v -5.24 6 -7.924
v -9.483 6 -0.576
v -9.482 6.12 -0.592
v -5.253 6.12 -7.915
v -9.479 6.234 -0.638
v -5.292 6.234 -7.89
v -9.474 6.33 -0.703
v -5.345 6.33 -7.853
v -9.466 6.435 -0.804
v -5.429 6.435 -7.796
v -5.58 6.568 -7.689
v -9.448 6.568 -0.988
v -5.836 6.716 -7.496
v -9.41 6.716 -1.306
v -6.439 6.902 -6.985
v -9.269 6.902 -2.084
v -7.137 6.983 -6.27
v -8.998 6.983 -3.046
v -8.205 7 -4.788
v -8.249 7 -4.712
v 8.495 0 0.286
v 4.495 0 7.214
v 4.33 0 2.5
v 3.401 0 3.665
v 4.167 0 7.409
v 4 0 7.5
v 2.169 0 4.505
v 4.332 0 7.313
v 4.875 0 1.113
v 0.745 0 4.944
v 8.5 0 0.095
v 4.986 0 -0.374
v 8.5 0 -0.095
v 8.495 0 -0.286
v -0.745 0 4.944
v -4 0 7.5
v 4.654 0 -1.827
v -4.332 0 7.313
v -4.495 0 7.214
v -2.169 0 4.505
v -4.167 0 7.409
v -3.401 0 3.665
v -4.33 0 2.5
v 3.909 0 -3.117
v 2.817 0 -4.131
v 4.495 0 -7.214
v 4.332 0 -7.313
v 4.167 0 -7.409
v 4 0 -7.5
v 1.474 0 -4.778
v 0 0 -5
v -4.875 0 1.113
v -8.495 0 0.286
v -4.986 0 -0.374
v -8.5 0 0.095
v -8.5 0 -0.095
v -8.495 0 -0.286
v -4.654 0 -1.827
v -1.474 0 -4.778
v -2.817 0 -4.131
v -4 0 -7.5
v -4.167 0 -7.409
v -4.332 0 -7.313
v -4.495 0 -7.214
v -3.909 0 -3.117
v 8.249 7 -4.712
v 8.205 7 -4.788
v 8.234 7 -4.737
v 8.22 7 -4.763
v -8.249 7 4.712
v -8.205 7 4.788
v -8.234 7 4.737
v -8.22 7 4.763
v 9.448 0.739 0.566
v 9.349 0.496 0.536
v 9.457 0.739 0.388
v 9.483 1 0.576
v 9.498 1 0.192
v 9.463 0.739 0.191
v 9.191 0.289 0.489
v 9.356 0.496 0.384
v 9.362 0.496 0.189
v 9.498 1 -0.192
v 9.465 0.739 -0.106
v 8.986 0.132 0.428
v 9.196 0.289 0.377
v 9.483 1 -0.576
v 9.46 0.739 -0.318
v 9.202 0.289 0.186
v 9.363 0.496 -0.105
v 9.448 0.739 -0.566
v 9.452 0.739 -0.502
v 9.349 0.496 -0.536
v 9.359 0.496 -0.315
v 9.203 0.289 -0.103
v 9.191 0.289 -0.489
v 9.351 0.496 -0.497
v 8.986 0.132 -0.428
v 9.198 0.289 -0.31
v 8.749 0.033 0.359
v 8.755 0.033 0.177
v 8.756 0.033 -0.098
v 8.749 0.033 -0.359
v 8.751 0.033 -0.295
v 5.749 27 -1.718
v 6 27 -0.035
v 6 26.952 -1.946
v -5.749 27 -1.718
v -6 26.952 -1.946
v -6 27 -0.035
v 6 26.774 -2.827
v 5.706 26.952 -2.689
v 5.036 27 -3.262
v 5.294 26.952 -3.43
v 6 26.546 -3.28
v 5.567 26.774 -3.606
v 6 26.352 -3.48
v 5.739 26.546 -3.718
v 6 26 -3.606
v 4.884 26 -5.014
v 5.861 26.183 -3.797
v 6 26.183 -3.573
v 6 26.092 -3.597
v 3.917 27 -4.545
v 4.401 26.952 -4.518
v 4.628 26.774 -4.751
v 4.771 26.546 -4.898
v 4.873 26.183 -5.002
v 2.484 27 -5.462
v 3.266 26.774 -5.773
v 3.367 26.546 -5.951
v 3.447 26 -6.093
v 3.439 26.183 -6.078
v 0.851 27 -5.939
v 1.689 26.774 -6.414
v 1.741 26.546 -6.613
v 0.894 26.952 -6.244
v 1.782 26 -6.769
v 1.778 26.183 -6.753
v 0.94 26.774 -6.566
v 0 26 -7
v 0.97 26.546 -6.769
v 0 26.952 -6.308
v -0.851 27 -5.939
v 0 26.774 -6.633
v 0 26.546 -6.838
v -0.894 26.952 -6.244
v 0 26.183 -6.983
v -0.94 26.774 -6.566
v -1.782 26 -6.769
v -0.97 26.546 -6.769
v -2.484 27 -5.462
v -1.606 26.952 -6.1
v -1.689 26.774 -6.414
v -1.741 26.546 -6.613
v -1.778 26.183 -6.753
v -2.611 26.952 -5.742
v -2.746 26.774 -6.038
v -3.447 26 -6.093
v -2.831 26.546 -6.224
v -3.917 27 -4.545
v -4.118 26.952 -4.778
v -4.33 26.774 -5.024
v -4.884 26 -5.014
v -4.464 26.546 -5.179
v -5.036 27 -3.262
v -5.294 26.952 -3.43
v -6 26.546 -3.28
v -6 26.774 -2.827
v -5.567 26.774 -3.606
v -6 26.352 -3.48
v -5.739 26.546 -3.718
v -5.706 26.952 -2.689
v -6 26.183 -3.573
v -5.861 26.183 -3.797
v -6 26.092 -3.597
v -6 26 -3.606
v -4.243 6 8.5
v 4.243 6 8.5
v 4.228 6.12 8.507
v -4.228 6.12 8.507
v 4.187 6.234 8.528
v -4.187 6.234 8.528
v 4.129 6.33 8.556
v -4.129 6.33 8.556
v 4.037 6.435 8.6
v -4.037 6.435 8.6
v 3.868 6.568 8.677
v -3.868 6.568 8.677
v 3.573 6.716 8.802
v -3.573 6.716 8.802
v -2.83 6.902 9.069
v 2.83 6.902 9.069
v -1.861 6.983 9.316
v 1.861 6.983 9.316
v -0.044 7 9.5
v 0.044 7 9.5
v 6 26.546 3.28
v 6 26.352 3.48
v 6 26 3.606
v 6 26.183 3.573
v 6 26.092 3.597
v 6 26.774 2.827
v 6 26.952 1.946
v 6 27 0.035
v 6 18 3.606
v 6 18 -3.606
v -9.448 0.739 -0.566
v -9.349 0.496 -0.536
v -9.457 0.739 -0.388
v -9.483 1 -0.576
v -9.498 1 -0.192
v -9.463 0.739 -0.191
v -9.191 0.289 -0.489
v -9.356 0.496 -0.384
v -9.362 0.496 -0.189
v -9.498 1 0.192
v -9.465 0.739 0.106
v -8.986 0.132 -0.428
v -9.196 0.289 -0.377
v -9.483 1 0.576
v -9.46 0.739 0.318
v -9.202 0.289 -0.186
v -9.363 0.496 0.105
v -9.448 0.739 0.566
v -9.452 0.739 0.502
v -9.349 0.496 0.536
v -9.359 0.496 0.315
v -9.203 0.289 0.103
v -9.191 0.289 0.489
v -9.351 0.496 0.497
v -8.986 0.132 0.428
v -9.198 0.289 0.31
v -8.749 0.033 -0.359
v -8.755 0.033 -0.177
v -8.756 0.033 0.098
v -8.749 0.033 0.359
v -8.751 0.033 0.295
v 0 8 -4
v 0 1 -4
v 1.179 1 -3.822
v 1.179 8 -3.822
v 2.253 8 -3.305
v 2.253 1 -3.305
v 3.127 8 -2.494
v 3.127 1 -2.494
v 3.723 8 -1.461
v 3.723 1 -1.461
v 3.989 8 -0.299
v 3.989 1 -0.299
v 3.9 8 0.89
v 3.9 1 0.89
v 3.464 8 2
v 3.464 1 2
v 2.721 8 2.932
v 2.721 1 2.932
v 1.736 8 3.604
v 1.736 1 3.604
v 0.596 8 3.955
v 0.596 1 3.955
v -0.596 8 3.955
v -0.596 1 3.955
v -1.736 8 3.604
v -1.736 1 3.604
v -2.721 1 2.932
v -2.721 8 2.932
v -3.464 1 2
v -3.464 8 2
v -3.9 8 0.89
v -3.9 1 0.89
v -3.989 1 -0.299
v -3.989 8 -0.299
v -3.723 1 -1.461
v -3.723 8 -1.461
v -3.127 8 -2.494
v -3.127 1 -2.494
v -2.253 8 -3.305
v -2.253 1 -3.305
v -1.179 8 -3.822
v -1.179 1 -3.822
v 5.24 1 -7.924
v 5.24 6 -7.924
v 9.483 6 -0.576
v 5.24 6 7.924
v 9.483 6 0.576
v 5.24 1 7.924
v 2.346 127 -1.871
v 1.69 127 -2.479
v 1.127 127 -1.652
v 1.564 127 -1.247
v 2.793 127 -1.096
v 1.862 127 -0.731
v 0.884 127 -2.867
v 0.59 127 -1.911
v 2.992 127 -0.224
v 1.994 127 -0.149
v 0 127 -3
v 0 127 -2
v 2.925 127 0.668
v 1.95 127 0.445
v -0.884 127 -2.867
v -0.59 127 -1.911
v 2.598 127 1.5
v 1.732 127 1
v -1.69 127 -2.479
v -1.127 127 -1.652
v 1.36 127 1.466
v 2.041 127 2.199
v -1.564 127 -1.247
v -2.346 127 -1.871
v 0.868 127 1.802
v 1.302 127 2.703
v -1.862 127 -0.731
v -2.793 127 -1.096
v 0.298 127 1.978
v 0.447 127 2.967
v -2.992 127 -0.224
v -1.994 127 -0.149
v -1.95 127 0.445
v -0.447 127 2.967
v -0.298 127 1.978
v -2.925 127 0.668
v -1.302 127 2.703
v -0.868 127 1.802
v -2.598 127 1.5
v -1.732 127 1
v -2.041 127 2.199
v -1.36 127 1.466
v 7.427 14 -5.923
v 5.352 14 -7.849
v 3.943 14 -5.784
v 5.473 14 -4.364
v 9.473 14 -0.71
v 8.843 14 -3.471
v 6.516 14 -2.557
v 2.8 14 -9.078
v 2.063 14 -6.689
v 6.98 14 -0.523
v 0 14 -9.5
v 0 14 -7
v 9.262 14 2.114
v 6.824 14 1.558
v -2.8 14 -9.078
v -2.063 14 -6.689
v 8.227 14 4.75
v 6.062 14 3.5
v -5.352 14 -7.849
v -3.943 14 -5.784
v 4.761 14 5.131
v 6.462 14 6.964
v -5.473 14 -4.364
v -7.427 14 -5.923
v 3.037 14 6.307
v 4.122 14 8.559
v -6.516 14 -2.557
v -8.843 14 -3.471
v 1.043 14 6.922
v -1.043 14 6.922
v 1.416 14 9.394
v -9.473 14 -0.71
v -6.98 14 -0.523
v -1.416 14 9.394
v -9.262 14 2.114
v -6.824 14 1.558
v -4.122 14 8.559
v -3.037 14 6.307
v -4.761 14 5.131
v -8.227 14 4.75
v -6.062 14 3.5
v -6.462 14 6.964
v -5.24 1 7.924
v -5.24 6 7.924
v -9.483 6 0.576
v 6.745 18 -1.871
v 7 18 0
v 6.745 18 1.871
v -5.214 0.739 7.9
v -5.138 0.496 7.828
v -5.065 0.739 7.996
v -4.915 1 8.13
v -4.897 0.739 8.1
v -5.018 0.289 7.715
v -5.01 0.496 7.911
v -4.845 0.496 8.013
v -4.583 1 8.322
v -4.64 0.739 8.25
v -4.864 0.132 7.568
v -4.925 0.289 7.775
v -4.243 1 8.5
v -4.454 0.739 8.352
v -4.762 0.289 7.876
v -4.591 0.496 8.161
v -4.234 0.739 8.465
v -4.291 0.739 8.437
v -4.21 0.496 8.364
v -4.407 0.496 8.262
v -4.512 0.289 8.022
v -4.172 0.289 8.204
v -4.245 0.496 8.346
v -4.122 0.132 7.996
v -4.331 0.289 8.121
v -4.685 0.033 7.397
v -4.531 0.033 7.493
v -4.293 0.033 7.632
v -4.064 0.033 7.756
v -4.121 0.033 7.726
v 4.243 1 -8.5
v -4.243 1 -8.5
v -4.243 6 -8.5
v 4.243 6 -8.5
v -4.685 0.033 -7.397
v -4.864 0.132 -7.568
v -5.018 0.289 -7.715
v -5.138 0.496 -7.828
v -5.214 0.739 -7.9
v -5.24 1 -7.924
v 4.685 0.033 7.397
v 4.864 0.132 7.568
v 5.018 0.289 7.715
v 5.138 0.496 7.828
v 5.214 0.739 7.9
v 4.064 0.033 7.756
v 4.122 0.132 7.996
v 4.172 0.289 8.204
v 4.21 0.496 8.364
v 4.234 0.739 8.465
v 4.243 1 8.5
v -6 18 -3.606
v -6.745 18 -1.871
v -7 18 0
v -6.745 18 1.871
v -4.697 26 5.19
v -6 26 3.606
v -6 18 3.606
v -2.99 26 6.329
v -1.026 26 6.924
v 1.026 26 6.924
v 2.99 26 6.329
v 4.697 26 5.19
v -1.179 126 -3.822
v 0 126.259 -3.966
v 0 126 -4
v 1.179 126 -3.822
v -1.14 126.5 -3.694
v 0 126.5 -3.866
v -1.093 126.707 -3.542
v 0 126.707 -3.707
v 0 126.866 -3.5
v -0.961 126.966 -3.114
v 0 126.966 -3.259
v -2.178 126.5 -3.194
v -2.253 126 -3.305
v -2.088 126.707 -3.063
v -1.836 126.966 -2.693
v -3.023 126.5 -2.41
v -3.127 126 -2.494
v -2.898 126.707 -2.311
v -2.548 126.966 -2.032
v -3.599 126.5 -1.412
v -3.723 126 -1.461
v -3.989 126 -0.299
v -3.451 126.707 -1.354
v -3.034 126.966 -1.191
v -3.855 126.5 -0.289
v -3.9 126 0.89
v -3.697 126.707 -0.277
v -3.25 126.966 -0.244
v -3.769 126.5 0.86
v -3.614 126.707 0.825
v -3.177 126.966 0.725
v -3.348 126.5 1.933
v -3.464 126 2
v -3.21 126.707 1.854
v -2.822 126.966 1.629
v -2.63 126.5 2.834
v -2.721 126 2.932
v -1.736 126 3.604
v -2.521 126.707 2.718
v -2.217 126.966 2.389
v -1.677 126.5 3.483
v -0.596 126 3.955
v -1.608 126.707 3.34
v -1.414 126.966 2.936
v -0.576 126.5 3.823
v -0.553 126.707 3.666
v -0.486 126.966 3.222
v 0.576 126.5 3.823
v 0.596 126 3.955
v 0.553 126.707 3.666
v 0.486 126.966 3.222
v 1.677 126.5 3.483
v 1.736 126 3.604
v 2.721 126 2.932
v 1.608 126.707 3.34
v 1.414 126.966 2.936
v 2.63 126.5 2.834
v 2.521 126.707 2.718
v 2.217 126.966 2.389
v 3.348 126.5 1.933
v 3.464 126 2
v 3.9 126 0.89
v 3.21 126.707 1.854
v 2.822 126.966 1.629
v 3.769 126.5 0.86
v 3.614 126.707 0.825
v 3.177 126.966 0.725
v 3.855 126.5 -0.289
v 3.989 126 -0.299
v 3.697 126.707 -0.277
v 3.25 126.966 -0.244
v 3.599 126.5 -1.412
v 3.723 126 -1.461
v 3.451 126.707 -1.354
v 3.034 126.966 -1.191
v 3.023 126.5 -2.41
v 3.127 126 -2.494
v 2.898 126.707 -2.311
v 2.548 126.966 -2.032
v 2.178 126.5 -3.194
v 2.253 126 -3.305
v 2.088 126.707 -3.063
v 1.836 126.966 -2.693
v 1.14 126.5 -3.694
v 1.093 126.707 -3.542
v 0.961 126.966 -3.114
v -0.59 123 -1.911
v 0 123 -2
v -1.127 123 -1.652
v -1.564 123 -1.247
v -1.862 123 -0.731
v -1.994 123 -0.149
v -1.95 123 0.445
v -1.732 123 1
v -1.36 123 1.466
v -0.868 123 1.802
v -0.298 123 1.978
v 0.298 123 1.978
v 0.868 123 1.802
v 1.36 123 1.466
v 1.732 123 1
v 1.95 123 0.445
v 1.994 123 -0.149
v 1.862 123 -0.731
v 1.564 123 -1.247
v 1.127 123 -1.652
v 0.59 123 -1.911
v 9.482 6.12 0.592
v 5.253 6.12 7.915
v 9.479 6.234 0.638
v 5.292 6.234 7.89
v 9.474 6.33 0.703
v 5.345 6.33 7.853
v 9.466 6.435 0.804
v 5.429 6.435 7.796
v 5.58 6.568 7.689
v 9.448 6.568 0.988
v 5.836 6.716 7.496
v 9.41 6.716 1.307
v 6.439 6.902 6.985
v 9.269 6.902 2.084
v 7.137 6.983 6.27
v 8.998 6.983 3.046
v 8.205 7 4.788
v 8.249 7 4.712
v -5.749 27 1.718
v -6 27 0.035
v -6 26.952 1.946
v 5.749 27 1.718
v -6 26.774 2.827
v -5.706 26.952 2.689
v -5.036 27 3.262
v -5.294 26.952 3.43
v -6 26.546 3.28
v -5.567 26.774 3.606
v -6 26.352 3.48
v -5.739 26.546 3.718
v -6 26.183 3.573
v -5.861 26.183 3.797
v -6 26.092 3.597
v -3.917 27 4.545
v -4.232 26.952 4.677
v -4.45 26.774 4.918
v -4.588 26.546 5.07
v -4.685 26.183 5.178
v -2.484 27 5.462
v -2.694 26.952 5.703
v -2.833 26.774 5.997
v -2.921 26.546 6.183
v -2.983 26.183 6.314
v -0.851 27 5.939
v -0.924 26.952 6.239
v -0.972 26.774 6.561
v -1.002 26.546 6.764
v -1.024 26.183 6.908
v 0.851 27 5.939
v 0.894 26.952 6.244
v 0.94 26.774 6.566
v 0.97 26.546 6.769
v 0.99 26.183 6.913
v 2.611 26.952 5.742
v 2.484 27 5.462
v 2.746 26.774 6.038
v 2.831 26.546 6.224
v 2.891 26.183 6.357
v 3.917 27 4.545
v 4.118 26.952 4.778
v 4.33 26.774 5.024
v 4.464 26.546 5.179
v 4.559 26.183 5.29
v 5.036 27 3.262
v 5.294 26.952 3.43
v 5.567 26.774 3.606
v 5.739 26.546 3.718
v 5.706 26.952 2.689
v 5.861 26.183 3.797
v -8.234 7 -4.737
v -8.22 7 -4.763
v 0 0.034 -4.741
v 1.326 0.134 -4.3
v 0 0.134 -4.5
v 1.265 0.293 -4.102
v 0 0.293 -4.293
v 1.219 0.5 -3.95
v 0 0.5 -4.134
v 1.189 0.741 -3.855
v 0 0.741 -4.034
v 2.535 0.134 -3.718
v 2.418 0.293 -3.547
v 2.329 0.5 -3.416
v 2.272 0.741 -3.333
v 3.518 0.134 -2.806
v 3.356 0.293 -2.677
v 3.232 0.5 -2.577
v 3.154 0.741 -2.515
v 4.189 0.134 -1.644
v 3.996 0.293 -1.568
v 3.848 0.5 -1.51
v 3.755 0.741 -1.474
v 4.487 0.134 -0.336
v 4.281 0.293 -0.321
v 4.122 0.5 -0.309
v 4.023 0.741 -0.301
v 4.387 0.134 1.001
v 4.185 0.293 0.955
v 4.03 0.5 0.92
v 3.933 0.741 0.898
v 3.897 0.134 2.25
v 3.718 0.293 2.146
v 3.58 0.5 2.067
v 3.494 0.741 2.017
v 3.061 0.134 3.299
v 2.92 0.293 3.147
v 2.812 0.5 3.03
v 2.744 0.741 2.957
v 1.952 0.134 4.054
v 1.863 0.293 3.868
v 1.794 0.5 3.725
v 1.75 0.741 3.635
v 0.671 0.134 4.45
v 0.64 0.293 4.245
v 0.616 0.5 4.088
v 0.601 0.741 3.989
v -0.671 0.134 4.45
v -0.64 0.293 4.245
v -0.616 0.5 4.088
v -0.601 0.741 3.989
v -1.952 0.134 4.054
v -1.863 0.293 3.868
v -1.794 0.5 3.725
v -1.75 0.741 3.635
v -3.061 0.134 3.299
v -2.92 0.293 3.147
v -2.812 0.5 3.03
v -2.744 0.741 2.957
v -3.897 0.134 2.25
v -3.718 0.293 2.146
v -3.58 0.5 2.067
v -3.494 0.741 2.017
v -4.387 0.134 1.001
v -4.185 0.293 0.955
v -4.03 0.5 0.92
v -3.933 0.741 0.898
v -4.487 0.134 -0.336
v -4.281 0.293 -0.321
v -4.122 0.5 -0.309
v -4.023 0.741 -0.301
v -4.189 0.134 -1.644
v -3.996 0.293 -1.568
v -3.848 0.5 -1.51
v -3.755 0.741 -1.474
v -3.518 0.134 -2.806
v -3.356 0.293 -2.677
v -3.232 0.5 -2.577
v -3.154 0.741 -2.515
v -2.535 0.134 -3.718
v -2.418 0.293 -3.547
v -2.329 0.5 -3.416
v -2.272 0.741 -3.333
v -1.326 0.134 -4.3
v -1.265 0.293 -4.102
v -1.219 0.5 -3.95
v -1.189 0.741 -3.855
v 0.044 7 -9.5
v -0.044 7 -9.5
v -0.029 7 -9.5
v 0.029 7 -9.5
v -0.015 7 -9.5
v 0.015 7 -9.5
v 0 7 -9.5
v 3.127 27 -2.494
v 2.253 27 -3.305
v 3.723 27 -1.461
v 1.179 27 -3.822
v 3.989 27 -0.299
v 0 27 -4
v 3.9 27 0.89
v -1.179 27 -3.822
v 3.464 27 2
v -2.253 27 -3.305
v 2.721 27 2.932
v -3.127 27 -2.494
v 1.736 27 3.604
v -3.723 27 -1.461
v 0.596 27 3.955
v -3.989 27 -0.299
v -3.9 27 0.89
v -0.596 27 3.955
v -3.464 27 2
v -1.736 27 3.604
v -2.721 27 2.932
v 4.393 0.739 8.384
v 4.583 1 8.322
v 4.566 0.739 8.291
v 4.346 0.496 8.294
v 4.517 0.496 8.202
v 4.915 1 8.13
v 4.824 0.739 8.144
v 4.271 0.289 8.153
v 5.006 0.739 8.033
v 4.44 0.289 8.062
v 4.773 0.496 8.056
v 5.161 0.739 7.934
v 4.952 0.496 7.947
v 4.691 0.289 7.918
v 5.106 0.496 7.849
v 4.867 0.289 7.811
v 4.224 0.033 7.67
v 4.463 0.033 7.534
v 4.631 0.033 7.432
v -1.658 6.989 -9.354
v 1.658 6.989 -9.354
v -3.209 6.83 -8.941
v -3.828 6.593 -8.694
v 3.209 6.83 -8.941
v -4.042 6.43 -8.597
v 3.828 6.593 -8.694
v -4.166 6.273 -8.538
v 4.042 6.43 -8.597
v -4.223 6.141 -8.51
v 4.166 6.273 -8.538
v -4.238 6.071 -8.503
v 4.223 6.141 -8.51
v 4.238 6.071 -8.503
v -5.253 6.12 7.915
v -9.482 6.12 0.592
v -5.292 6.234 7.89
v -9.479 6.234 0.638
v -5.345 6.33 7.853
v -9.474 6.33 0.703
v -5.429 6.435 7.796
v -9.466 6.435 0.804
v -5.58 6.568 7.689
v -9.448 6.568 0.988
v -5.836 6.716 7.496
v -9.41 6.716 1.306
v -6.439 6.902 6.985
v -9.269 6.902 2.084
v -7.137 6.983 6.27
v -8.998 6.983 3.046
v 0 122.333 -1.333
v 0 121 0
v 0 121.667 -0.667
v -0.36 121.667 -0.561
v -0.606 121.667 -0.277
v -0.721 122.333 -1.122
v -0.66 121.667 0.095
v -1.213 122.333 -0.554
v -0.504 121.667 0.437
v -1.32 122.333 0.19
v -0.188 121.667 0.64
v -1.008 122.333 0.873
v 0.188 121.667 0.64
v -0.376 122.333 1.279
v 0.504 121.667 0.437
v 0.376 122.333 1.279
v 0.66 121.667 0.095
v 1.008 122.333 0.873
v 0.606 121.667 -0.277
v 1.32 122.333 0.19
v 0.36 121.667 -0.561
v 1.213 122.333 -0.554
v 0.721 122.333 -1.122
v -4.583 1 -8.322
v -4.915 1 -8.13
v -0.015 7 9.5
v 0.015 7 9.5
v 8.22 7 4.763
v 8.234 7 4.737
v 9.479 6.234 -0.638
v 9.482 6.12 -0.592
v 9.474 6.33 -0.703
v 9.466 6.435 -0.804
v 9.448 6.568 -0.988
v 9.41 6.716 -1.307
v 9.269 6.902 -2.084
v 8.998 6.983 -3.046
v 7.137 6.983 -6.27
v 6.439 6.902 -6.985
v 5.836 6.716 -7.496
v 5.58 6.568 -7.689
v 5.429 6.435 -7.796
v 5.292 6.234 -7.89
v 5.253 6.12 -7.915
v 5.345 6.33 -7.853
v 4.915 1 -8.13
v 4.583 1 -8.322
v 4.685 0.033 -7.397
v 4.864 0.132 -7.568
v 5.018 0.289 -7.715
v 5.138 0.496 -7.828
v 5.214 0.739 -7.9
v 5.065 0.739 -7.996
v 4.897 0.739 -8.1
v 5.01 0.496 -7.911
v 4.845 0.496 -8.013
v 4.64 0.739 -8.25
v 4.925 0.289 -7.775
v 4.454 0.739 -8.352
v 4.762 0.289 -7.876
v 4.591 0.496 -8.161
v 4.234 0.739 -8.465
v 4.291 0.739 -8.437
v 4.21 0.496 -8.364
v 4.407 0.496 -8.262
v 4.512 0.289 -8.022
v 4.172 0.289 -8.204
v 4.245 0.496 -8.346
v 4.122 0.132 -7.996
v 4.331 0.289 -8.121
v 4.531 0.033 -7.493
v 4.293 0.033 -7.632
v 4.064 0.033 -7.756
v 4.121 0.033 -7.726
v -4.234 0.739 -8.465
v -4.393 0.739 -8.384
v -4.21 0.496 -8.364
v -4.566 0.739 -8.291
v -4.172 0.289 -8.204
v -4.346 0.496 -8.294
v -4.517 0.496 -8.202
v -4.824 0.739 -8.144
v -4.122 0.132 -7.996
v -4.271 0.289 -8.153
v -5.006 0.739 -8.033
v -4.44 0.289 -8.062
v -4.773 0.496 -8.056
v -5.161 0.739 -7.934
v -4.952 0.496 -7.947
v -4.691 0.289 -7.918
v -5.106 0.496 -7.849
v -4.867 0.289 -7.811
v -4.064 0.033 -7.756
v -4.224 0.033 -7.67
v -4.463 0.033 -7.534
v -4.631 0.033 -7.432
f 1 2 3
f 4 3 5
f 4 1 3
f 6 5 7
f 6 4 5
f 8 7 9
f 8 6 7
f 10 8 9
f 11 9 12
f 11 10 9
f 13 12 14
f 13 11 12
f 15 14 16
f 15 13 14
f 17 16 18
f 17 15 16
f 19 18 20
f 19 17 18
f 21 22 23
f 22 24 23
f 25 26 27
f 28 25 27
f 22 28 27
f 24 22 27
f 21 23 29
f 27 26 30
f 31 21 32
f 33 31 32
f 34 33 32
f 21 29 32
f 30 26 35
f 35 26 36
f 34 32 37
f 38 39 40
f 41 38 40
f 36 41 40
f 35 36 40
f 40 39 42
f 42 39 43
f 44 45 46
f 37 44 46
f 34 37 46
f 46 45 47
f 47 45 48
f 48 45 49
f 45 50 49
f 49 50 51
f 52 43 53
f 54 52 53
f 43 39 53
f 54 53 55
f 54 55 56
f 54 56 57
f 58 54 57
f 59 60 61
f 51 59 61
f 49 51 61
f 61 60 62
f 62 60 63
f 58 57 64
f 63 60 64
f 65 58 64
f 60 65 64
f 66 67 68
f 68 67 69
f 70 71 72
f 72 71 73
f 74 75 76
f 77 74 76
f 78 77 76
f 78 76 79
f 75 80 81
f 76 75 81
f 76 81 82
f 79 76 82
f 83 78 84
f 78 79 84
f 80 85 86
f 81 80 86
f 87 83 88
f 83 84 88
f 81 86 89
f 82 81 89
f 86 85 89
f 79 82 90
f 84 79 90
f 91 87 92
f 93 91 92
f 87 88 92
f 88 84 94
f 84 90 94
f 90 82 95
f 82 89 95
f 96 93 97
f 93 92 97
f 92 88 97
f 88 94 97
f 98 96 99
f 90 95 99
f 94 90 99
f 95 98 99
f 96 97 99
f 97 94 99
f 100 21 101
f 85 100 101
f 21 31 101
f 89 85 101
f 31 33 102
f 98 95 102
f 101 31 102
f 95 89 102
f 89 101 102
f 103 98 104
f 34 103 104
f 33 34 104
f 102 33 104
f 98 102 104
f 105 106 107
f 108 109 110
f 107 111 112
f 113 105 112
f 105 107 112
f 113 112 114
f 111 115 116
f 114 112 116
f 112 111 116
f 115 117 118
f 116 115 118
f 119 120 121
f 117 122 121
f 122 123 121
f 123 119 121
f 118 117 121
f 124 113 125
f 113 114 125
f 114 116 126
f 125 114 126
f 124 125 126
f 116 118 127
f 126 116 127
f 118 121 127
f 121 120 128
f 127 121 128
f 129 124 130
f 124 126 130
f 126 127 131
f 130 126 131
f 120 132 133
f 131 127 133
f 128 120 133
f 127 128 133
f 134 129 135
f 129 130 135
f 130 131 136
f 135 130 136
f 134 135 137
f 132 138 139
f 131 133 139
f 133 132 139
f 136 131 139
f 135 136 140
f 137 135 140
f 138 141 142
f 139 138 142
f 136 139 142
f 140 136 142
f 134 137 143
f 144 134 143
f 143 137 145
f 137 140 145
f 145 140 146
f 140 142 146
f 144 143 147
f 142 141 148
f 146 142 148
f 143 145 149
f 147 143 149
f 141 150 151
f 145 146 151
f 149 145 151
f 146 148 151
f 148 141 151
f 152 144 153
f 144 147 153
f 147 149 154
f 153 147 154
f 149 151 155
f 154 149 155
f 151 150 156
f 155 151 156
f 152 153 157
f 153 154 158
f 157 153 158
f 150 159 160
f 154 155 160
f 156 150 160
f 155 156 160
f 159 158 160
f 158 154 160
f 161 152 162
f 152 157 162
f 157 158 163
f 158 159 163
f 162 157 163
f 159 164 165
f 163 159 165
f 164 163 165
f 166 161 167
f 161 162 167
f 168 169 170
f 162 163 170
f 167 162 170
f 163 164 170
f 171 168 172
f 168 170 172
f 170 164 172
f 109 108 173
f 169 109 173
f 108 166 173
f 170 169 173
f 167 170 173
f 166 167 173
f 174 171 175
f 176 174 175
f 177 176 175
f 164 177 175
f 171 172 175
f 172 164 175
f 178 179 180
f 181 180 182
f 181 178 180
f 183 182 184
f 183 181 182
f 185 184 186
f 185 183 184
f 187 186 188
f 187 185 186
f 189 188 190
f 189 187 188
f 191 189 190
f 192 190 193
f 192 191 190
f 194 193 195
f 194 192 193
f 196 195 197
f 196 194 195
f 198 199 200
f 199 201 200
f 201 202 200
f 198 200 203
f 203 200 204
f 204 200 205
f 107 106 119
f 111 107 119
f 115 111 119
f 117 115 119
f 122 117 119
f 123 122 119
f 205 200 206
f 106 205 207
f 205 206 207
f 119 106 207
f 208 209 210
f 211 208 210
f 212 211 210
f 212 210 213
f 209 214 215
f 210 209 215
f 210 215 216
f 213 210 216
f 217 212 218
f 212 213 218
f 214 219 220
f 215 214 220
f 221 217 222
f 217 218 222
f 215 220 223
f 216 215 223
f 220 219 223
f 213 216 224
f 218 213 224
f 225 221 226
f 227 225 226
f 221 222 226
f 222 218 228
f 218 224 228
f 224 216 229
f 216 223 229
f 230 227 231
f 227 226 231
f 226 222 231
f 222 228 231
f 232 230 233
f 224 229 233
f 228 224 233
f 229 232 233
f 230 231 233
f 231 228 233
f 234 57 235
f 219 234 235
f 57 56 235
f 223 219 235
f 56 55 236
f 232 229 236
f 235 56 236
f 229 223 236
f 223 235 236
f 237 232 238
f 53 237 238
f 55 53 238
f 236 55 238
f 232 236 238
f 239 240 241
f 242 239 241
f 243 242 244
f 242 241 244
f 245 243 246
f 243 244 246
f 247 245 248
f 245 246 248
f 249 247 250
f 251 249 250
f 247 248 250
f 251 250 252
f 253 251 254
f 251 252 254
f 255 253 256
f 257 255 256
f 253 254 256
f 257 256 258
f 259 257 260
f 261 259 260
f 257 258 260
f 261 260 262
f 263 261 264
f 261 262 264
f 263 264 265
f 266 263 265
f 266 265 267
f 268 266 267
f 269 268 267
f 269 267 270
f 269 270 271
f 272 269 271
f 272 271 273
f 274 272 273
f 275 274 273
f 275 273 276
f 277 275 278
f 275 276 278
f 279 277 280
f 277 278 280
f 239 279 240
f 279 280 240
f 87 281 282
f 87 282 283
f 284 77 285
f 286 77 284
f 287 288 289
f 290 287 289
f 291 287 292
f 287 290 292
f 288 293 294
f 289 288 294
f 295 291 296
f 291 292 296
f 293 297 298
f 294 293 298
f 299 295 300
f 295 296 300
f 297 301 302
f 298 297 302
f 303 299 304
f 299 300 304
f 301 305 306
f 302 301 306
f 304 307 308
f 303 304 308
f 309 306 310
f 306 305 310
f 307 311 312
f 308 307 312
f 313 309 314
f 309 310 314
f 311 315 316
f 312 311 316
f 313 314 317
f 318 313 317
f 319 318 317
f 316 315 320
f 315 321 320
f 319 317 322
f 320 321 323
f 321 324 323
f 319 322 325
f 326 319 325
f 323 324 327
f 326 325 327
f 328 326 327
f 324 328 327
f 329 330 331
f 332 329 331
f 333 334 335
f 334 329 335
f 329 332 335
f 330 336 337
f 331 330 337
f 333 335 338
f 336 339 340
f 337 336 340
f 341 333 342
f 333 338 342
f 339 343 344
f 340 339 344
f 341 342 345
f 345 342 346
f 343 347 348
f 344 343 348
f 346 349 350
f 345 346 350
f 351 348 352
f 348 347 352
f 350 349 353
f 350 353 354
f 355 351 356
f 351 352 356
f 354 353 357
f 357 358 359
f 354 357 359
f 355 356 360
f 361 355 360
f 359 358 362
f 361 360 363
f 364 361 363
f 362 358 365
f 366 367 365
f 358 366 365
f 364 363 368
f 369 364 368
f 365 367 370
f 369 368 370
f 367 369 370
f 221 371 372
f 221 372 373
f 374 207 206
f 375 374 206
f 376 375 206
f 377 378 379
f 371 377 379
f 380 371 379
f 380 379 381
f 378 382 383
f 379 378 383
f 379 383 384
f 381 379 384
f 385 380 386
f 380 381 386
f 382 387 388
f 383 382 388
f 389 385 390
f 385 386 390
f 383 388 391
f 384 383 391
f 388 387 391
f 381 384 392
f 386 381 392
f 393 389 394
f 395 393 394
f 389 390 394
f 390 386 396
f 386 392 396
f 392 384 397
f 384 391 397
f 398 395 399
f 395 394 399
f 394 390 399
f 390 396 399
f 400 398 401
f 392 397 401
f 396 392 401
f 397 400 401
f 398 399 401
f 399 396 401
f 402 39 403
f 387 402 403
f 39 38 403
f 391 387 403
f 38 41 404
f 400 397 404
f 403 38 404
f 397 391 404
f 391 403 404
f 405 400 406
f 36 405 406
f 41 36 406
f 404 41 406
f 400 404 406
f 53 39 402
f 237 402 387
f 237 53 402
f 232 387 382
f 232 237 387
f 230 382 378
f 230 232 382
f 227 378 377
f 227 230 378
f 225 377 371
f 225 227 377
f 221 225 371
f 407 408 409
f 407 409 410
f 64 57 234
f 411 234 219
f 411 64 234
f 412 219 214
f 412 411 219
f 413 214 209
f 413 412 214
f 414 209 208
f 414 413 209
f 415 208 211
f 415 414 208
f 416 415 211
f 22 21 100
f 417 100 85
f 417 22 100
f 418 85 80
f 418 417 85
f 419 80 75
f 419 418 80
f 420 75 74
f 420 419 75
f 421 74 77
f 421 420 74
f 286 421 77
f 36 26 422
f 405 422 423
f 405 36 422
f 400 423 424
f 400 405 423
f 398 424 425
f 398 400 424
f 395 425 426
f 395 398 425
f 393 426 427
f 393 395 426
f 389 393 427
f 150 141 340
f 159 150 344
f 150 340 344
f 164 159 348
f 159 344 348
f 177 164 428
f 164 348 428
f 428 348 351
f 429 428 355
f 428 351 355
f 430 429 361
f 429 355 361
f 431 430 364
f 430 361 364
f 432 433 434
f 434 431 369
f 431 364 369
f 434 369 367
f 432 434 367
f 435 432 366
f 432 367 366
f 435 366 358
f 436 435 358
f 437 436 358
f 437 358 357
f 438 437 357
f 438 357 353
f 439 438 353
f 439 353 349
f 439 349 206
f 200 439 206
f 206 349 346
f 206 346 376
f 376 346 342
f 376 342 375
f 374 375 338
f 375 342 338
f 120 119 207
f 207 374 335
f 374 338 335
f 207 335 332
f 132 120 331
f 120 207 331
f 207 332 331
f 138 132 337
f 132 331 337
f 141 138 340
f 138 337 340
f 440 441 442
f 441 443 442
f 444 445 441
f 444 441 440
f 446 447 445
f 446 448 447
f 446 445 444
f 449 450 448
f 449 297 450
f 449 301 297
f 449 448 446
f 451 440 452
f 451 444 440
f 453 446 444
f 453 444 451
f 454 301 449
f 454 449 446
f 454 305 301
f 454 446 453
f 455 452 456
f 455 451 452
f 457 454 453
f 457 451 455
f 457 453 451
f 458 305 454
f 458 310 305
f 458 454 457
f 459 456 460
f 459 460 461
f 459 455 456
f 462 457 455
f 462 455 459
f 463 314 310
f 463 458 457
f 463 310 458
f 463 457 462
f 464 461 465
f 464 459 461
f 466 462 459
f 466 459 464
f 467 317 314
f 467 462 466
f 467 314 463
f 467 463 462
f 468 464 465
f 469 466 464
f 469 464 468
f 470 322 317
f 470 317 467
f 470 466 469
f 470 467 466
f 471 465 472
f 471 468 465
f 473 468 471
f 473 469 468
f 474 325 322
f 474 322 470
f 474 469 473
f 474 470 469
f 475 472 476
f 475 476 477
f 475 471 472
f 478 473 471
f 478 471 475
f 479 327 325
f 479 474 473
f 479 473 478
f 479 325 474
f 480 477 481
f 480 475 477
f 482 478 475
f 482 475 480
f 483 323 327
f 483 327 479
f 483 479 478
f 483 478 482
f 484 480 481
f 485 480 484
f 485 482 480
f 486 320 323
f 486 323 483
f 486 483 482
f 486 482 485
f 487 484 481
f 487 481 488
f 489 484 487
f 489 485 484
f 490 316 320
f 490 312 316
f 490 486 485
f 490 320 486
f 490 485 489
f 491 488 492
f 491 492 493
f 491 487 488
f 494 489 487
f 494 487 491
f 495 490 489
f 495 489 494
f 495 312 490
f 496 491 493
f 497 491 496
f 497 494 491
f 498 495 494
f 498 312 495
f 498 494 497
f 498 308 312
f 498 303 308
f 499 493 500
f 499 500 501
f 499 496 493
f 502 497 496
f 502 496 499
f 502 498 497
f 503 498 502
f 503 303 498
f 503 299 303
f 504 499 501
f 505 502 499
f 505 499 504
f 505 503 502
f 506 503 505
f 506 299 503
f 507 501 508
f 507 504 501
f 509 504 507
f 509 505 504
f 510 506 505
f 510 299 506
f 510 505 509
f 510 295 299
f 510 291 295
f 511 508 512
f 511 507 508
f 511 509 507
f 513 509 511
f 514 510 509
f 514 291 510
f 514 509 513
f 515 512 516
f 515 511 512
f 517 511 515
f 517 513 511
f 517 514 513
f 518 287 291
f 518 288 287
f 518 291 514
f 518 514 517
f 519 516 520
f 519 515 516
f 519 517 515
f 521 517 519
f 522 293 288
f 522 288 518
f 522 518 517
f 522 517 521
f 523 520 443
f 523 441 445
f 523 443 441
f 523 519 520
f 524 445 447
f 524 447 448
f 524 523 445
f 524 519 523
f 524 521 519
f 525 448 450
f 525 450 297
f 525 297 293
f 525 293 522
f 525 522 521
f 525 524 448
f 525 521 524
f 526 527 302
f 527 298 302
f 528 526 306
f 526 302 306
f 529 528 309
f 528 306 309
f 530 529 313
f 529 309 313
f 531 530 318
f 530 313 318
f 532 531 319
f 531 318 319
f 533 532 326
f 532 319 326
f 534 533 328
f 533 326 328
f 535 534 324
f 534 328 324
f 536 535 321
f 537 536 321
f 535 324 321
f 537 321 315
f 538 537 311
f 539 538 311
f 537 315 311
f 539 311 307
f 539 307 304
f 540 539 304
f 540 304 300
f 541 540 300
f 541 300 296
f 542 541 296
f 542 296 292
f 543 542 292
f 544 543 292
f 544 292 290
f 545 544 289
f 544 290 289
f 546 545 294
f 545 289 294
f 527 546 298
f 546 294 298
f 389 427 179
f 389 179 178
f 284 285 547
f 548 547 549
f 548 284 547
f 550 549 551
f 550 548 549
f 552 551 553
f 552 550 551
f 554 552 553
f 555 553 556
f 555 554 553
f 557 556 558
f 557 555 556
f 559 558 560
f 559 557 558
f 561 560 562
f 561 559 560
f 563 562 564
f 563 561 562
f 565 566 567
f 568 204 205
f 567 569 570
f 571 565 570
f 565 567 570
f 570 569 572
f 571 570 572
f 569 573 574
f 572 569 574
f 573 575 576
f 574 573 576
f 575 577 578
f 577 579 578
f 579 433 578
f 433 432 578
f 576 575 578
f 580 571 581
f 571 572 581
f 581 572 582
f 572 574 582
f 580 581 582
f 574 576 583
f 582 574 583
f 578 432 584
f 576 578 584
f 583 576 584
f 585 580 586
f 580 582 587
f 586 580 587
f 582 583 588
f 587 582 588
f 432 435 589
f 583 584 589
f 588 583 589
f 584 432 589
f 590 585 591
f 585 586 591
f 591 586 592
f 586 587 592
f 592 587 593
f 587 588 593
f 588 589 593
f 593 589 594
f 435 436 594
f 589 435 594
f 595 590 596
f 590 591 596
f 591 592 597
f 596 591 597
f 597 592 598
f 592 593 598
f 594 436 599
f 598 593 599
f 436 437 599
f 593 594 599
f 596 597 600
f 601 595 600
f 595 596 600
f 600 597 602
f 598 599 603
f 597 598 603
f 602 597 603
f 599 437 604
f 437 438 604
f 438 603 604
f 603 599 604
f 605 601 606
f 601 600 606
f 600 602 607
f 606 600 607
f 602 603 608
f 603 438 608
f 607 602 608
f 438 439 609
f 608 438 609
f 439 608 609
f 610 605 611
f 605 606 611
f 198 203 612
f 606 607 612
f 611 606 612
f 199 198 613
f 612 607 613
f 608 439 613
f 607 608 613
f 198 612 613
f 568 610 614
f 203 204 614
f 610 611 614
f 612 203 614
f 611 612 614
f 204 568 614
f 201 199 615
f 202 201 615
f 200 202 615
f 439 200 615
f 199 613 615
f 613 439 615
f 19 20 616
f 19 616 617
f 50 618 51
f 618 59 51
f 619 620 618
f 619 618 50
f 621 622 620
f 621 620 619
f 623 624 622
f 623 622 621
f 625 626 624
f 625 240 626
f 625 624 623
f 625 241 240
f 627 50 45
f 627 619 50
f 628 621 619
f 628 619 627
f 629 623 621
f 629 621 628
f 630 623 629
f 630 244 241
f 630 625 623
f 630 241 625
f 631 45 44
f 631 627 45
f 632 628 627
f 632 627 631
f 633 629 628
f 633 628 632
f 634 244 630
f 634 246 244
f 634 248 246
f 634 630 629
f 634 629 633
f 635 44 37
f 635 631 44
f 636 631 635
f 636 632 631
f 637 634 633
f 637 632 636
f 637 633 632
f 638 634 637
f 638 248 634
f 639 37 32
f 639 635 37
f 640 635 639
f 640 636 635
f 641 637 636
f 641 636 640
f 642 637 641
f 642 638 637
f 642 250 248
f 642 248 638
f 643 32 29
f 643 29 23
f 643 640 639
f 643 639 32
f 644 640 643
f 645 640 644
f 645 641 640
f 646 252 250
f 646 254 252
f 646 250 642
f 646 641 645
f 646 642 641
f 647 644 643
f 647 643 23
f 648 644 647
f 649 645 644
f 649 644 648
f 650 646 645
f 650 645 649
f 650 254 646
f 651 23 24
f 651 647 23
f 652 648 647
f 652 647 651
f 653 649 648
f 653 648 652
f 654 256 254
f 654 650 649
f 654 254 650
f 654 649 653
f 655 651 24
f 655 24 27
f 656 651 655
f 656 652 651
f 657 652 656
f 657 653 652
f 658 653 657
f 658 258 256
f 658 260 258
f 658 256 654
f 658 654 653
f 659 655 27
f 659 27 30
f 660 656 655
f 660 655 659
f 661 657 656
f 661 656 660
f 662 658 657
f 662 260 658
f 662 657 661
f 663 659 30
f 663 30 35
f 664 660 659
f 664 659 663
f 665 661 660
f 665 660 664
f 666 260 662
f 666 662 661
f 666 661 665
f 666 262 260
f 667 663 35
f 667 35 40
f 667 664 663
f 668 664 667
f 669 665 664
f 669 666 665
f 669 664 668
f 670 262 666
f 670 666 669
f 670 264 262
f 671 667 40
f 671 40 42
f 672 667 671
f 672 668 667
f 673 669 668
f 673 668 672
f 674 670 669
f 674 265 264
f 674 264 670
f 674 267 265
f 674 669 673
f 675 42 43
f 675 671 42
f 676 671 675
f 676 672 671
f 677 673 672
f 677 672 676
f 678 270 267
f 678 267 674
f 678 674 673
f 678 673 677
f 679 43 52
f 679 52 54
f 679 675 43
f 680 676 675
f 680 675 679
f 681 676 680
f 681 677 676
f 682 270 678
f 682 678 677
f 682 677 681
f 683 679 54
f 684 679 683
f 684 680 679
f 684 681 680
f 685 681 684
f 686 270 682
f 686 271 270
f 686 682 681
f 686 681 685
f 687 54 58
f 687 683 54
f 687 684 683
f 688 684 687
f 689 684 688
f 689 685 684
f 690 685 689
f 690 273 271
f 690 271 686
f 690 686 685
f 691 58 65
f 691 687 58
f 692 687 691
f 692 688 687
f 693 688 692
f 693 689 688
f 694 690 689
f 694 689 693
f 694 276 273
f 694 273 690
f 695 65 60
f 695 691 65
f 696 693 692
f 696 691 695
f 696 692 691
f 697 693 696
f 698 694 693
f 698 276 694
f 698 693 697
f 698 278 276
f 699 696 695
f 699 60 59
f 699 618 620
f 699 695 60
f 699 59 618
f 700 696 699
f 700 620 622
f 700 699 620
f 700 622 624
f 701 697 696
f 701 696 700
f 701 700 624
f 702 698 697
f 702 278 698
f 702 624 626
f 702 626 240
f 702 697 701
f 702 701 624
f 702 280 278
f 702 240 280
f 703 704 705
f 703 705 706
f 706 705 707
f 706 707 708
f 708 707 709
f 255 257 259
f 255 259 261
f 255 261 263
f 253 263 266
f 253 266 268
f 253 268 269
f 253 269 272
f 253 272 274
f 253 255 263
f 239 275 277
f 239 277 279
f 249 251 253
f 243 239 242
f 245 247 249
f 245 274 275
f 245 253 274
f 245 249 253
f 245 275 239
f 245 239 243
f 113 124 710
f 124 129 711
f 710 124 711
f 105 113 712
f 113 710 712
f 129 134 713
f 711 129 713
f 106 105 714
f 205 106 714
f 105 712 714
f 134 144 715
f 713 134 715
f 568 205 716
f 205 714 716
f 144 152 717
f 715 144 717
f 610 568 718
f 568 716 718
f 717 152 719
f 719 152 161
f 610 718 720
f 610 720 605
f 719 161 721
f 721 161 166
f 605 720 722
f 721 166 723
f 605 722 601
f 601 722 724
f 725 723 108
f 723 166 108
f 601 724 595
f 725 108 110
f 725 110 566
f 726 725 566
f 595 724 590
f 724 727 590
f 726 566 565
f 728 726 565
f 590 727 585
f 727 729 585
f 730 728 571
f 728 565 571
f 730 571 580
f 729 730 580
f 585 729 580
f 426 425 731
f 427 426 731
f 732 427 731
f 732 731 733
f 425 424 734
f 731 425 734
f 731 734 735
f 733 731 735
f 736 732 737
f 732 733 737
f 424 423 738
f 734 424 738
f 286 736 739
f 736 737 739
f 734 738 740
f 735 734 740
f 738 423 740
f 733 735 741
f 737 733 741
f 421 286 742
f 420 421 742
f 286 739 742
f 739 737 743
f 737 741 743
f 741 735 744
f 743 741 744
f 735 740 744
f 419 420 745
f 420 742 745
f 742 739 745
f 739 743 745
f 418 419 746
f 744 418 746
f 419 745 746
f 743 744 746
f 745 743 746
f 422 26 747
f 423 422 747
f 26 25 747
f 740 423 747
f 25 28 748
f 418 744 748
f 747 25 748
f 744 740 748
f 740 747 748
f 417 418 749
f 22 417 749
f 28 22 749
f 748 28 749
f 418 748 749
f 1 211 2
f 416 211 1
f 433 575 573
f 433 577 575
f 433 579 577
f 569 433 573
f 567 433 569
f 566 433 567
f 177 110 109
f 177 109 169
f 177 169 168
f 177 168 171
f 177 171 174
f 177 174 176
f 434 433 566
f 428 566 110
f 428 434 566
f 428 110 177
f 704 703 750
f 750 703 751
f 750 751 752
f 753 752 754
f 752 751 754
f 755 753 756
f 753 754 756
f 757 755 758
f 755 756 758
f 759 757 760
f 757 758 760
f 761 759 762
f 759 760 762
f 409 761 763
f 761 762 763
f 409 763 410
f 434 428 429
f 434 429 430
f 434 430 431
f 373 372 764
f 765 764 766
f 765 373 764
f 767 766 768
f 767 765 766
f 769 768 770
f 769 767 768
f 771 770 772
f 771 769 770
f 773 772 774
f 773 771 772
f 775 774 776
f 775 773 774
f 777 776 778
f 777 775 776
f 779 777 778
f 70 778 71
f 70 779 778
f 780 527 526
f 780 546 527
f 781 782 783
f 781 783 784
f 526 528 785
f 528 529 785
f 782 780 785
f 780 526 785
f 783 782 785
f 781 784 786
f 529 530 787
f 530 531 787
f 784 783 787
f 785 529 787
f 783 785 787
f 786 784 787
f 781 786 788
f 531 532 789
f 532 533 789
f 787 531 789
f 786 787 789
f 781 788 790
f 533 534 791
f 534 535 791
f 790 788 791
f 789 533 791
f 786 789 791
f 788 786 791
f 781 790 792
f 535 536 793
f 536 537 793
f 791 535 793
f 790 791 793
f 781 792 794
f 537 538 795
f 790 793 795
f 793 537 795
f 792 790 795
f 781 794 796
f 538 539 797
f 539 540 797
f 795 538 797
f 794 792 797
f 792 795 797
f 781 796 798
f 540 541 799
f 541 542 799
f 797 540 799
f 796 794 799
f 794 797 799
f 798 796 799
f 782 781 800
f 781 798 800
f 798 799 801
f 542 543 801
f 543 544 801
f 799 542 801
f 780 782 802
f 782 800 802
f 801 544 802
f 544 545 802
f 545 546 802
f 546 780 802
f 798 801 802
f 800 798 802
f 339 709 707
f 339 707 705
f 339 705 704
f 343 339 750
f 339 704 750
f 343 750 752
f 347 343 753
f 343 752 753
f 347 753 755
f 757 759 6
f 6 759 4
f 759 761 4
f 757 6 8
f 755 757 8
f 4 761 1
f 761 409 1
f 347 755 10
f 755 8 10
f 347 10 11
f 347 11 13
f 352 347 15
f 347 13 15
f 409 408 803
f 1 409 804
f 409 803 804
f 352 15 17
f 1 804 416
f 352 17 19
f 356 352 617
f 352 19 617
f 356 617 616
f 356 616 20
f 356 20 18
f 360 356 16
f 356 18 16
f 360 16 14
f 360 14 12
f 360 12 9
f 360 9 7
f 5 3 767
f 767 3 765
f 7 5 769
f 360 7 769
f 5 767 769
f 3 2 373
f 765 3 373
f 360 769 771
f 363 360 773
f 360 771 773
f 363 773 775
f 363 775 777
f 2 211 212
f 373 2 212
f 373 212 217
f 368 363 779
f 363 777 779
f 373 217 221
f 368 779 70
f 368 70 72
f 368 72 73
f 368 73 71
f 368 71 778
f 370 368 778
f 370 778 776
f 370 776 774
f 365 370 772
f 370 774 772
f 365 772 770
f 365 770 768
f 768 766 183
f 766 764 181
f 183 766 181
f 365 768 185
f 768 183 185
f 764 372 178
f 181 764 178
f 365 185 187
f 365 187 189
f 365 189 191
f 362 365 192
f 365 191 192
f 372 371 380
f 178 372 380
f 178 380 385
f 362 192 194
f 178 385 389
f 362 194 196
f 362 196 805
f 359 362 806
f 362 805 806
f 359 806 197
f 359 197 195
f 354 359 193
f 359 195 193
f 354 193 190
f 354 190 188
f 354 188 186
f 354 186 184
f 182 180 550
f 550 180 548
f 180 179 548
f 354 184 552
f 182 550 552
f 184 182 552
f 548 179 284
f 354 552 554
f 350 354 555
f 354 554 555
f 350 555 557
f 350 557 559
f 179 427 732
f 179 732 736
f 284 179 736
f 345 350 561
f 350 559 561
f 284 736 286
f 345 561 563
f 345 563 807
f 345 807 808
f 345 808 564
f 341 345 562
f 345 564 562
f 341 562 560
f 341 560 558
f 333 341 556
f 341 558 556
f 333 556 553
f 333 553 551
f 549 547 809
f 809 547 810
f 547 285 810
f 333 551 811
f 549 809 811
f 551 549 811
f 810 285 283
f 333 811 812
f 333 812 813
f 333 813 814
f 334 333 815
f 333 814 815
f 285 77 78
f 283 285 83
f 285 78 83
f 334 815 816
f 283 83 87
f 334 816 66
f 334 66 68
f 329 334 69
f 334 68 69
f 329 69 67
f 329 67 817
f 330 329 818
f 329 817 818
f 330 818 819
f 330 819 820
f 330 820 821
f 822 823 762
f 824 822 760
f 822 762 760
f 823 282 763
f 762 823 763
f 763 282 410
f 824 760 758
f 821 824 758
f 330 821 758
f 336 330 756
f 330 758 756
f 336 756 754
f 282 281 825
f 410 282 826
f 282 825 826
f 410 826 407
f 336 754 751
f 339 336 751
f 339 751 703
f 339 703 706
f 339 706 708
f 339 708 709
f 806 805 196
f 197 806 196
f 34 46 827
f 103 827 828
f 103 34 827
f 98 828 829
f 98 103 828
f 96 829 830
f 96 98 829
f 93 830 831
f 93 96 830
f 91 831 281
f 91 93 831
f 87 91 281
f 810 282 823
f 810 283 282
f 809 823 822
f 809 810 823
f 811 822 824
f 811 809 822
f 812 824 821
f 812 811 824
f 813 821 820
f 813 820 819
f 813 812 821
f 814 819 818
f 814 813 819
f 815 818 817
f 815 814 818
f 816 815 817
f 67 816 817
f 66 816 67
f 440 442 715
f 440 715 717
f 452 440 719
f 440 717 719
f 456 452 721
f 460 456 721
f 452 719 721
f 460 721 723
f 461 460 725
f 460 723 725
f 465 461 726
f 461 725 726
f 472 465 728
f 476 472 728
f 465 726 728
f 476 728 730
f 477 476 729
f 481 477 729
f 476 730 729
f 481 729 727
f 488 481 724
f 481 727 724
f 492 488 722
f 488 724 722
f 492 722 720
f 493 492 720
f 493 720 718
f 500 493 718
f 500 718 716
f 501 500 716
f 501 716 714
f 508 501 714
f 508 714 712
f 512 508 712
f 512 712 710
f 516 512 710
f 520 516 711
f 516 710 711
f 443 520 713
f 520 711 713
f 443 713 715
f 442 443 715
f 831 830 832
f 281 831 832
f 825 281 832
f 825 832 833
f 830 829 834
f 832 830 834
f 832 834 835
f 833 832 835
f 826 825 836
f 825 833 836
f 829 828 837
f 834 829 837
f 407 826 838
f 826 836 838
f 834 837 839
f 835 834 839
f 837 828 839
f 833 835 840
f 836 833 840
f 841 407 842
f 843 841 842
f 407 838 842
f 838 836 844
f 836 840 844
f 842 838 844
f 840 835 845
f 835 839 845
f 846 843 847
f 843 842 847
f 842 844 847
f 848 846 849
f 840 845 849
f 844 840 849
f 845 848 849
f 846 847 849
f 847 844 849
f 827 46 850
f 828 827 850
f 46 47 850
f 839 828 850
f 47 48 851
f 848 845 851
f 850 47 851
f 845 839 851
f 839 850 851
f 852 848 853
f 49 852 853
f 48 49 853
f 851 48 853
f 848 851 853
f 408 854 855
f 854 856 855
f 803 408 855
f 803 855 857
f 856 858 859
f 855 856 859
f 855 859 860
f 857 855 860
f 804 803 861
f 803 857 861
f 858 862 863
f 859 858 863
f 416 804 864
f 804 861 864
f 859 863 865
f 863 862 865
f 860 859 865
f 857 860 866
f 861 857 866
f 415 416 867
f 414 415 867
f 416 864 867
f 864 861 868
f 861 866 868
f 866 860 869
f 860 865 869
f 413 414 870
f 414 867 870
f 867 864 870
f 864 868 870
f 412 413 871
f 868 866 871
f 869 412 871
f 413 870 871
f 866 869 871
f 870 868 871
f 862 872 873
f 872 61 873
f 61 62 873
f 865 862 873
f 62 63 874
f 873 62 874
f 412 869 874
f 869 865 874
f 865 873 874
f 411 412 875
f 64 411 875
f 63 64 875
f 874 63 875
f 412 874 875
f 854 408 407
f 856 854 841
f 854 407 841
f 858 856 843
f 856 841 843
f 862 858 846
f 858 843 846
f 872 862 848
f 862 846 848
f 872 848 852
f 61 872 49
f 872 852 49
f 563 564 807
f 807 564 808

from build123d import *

# Parameters (mm, degrees)
ESQUISSE2_R             = 4
ENL_V_MAT_EXTRU_1_DEPTH = 8
ENL_V_START             = -9
ENL_V_MAT_EXTRU_2_DEPTH = 9
ESQUISSE4_R             = 15
ENL_V_MAT_EXTRU_3_DEPTH = 7
CONG_1_R                = 1


with BuildPart() as part:
    # Esquisse1 → Révolution1 (revolve)
    with BuildSketch(Plane.XY, mode=Mode.PRIVATE) as r_volution1_sk:
        Polygon((4, 127), (4, 27), (7, 27), (7, 14), (9.5, 14), (9.5, 0), (0, 0), (0, 121), (2, 123), (2, 127), align=None)
    revolve(r_volution1_sk.sketch.rotate(Axis((0, 0, 0), (0, 1, 0)), 90), axis=Axis((0, 0, 0), (0, 1, 0)))

    # Esquisse2 → Enlèv. mat.-Extru.1 (cut)
    with BuildSketch(Plane.XZ):
        with Locations(Location((0, 0, 0), (0, 0, 270))):
            Circle(ESQUISSE2_R)
    extrude(amount=-ENL_V_MAT_EXTRU_1_DEPTH, mode=Mode.SUBTRACT)

    # Esquisse3 → Enlèv. mat.-Extru.2 (cut)
    with BuildSketch(Plane(origin=(0, 27, 0), x_dir=(1, 0, 0), z_dir=(0, 1, 0)).offset(ENL_V_START)):
        with BuildLine():
            Line((6, -3.605551275), (6, 3.605551275))
            ThreePointArc((6, 3.605551275), (7, 0), (6, -3.605551275))
        make_face()
        with BuildLine():
            Line((-6, -3.605551275), (-6, 3.605551275))
            ThreePointArc((-6, 3.605551275), (-7, 0), (-6, -3.605551275))
        make_face()
    extrude(amount=ENL_V_MAT_EXTRU_2_DEPTH, mode=Mode.SUBTRACT)

    # Esquisse4 → Enlèv. mat.-Extru.3 (cut)
    with BuildSketch(Plane.XZ):
        Circle(ESQUISSE4_R)
        Polygon((9.814954576, 0), (4.907477288, 8.5), (-4.907477288, 8.5), (-9.814954576, 0), (-4.907477288, -8.5), (4.907477288, -8.5), align=None, mode=Mode.SUBTRACT)
    extrude(amount=-ENL_V_MAT_EXTRU_3_DEPTH, mode=Mode.SUBTRACT)

    # Congé1
    cong_1_edges = [part.edges().sort_by_distance(p)[0] for p in [
        (0, 127, 4),
        (-3.446820352, 27, -6.092571663),
        (0, 27, 7),
        (0, 0, -8.5),
        (-4.75, 0, -8.227241336),
        (-7.361215932, 0, -4.25),
        (-9.5, 0, 0),
        (-7.361215932, 0, 4.25),
        (-4.75, 0, 8.227241336),
        (0, 0, 8.5),
        (4.75, 0, 8.227241336),
        (7.361215932, 0, 4.25),
        (9.5, 0, 0),
        (7.361215932, 0, -4.25),
        (4.75, 0, -8.227241336),
        (0, 0, 4),
        (0, 7, 8.5),
        (7.361215932, 7, 4.25),
        (7.361215932, 7, -4.25),
        (0, 7, -8.5),
        (-7.361215932, 7, -4.25),
        (-7.361215932, 7, 4.25),
    ]]
    fillet(cong_1_edges, radius=CONG_1_R - 0.0001)  # a hair under: the kernel refuses the full size


solid = part.part
